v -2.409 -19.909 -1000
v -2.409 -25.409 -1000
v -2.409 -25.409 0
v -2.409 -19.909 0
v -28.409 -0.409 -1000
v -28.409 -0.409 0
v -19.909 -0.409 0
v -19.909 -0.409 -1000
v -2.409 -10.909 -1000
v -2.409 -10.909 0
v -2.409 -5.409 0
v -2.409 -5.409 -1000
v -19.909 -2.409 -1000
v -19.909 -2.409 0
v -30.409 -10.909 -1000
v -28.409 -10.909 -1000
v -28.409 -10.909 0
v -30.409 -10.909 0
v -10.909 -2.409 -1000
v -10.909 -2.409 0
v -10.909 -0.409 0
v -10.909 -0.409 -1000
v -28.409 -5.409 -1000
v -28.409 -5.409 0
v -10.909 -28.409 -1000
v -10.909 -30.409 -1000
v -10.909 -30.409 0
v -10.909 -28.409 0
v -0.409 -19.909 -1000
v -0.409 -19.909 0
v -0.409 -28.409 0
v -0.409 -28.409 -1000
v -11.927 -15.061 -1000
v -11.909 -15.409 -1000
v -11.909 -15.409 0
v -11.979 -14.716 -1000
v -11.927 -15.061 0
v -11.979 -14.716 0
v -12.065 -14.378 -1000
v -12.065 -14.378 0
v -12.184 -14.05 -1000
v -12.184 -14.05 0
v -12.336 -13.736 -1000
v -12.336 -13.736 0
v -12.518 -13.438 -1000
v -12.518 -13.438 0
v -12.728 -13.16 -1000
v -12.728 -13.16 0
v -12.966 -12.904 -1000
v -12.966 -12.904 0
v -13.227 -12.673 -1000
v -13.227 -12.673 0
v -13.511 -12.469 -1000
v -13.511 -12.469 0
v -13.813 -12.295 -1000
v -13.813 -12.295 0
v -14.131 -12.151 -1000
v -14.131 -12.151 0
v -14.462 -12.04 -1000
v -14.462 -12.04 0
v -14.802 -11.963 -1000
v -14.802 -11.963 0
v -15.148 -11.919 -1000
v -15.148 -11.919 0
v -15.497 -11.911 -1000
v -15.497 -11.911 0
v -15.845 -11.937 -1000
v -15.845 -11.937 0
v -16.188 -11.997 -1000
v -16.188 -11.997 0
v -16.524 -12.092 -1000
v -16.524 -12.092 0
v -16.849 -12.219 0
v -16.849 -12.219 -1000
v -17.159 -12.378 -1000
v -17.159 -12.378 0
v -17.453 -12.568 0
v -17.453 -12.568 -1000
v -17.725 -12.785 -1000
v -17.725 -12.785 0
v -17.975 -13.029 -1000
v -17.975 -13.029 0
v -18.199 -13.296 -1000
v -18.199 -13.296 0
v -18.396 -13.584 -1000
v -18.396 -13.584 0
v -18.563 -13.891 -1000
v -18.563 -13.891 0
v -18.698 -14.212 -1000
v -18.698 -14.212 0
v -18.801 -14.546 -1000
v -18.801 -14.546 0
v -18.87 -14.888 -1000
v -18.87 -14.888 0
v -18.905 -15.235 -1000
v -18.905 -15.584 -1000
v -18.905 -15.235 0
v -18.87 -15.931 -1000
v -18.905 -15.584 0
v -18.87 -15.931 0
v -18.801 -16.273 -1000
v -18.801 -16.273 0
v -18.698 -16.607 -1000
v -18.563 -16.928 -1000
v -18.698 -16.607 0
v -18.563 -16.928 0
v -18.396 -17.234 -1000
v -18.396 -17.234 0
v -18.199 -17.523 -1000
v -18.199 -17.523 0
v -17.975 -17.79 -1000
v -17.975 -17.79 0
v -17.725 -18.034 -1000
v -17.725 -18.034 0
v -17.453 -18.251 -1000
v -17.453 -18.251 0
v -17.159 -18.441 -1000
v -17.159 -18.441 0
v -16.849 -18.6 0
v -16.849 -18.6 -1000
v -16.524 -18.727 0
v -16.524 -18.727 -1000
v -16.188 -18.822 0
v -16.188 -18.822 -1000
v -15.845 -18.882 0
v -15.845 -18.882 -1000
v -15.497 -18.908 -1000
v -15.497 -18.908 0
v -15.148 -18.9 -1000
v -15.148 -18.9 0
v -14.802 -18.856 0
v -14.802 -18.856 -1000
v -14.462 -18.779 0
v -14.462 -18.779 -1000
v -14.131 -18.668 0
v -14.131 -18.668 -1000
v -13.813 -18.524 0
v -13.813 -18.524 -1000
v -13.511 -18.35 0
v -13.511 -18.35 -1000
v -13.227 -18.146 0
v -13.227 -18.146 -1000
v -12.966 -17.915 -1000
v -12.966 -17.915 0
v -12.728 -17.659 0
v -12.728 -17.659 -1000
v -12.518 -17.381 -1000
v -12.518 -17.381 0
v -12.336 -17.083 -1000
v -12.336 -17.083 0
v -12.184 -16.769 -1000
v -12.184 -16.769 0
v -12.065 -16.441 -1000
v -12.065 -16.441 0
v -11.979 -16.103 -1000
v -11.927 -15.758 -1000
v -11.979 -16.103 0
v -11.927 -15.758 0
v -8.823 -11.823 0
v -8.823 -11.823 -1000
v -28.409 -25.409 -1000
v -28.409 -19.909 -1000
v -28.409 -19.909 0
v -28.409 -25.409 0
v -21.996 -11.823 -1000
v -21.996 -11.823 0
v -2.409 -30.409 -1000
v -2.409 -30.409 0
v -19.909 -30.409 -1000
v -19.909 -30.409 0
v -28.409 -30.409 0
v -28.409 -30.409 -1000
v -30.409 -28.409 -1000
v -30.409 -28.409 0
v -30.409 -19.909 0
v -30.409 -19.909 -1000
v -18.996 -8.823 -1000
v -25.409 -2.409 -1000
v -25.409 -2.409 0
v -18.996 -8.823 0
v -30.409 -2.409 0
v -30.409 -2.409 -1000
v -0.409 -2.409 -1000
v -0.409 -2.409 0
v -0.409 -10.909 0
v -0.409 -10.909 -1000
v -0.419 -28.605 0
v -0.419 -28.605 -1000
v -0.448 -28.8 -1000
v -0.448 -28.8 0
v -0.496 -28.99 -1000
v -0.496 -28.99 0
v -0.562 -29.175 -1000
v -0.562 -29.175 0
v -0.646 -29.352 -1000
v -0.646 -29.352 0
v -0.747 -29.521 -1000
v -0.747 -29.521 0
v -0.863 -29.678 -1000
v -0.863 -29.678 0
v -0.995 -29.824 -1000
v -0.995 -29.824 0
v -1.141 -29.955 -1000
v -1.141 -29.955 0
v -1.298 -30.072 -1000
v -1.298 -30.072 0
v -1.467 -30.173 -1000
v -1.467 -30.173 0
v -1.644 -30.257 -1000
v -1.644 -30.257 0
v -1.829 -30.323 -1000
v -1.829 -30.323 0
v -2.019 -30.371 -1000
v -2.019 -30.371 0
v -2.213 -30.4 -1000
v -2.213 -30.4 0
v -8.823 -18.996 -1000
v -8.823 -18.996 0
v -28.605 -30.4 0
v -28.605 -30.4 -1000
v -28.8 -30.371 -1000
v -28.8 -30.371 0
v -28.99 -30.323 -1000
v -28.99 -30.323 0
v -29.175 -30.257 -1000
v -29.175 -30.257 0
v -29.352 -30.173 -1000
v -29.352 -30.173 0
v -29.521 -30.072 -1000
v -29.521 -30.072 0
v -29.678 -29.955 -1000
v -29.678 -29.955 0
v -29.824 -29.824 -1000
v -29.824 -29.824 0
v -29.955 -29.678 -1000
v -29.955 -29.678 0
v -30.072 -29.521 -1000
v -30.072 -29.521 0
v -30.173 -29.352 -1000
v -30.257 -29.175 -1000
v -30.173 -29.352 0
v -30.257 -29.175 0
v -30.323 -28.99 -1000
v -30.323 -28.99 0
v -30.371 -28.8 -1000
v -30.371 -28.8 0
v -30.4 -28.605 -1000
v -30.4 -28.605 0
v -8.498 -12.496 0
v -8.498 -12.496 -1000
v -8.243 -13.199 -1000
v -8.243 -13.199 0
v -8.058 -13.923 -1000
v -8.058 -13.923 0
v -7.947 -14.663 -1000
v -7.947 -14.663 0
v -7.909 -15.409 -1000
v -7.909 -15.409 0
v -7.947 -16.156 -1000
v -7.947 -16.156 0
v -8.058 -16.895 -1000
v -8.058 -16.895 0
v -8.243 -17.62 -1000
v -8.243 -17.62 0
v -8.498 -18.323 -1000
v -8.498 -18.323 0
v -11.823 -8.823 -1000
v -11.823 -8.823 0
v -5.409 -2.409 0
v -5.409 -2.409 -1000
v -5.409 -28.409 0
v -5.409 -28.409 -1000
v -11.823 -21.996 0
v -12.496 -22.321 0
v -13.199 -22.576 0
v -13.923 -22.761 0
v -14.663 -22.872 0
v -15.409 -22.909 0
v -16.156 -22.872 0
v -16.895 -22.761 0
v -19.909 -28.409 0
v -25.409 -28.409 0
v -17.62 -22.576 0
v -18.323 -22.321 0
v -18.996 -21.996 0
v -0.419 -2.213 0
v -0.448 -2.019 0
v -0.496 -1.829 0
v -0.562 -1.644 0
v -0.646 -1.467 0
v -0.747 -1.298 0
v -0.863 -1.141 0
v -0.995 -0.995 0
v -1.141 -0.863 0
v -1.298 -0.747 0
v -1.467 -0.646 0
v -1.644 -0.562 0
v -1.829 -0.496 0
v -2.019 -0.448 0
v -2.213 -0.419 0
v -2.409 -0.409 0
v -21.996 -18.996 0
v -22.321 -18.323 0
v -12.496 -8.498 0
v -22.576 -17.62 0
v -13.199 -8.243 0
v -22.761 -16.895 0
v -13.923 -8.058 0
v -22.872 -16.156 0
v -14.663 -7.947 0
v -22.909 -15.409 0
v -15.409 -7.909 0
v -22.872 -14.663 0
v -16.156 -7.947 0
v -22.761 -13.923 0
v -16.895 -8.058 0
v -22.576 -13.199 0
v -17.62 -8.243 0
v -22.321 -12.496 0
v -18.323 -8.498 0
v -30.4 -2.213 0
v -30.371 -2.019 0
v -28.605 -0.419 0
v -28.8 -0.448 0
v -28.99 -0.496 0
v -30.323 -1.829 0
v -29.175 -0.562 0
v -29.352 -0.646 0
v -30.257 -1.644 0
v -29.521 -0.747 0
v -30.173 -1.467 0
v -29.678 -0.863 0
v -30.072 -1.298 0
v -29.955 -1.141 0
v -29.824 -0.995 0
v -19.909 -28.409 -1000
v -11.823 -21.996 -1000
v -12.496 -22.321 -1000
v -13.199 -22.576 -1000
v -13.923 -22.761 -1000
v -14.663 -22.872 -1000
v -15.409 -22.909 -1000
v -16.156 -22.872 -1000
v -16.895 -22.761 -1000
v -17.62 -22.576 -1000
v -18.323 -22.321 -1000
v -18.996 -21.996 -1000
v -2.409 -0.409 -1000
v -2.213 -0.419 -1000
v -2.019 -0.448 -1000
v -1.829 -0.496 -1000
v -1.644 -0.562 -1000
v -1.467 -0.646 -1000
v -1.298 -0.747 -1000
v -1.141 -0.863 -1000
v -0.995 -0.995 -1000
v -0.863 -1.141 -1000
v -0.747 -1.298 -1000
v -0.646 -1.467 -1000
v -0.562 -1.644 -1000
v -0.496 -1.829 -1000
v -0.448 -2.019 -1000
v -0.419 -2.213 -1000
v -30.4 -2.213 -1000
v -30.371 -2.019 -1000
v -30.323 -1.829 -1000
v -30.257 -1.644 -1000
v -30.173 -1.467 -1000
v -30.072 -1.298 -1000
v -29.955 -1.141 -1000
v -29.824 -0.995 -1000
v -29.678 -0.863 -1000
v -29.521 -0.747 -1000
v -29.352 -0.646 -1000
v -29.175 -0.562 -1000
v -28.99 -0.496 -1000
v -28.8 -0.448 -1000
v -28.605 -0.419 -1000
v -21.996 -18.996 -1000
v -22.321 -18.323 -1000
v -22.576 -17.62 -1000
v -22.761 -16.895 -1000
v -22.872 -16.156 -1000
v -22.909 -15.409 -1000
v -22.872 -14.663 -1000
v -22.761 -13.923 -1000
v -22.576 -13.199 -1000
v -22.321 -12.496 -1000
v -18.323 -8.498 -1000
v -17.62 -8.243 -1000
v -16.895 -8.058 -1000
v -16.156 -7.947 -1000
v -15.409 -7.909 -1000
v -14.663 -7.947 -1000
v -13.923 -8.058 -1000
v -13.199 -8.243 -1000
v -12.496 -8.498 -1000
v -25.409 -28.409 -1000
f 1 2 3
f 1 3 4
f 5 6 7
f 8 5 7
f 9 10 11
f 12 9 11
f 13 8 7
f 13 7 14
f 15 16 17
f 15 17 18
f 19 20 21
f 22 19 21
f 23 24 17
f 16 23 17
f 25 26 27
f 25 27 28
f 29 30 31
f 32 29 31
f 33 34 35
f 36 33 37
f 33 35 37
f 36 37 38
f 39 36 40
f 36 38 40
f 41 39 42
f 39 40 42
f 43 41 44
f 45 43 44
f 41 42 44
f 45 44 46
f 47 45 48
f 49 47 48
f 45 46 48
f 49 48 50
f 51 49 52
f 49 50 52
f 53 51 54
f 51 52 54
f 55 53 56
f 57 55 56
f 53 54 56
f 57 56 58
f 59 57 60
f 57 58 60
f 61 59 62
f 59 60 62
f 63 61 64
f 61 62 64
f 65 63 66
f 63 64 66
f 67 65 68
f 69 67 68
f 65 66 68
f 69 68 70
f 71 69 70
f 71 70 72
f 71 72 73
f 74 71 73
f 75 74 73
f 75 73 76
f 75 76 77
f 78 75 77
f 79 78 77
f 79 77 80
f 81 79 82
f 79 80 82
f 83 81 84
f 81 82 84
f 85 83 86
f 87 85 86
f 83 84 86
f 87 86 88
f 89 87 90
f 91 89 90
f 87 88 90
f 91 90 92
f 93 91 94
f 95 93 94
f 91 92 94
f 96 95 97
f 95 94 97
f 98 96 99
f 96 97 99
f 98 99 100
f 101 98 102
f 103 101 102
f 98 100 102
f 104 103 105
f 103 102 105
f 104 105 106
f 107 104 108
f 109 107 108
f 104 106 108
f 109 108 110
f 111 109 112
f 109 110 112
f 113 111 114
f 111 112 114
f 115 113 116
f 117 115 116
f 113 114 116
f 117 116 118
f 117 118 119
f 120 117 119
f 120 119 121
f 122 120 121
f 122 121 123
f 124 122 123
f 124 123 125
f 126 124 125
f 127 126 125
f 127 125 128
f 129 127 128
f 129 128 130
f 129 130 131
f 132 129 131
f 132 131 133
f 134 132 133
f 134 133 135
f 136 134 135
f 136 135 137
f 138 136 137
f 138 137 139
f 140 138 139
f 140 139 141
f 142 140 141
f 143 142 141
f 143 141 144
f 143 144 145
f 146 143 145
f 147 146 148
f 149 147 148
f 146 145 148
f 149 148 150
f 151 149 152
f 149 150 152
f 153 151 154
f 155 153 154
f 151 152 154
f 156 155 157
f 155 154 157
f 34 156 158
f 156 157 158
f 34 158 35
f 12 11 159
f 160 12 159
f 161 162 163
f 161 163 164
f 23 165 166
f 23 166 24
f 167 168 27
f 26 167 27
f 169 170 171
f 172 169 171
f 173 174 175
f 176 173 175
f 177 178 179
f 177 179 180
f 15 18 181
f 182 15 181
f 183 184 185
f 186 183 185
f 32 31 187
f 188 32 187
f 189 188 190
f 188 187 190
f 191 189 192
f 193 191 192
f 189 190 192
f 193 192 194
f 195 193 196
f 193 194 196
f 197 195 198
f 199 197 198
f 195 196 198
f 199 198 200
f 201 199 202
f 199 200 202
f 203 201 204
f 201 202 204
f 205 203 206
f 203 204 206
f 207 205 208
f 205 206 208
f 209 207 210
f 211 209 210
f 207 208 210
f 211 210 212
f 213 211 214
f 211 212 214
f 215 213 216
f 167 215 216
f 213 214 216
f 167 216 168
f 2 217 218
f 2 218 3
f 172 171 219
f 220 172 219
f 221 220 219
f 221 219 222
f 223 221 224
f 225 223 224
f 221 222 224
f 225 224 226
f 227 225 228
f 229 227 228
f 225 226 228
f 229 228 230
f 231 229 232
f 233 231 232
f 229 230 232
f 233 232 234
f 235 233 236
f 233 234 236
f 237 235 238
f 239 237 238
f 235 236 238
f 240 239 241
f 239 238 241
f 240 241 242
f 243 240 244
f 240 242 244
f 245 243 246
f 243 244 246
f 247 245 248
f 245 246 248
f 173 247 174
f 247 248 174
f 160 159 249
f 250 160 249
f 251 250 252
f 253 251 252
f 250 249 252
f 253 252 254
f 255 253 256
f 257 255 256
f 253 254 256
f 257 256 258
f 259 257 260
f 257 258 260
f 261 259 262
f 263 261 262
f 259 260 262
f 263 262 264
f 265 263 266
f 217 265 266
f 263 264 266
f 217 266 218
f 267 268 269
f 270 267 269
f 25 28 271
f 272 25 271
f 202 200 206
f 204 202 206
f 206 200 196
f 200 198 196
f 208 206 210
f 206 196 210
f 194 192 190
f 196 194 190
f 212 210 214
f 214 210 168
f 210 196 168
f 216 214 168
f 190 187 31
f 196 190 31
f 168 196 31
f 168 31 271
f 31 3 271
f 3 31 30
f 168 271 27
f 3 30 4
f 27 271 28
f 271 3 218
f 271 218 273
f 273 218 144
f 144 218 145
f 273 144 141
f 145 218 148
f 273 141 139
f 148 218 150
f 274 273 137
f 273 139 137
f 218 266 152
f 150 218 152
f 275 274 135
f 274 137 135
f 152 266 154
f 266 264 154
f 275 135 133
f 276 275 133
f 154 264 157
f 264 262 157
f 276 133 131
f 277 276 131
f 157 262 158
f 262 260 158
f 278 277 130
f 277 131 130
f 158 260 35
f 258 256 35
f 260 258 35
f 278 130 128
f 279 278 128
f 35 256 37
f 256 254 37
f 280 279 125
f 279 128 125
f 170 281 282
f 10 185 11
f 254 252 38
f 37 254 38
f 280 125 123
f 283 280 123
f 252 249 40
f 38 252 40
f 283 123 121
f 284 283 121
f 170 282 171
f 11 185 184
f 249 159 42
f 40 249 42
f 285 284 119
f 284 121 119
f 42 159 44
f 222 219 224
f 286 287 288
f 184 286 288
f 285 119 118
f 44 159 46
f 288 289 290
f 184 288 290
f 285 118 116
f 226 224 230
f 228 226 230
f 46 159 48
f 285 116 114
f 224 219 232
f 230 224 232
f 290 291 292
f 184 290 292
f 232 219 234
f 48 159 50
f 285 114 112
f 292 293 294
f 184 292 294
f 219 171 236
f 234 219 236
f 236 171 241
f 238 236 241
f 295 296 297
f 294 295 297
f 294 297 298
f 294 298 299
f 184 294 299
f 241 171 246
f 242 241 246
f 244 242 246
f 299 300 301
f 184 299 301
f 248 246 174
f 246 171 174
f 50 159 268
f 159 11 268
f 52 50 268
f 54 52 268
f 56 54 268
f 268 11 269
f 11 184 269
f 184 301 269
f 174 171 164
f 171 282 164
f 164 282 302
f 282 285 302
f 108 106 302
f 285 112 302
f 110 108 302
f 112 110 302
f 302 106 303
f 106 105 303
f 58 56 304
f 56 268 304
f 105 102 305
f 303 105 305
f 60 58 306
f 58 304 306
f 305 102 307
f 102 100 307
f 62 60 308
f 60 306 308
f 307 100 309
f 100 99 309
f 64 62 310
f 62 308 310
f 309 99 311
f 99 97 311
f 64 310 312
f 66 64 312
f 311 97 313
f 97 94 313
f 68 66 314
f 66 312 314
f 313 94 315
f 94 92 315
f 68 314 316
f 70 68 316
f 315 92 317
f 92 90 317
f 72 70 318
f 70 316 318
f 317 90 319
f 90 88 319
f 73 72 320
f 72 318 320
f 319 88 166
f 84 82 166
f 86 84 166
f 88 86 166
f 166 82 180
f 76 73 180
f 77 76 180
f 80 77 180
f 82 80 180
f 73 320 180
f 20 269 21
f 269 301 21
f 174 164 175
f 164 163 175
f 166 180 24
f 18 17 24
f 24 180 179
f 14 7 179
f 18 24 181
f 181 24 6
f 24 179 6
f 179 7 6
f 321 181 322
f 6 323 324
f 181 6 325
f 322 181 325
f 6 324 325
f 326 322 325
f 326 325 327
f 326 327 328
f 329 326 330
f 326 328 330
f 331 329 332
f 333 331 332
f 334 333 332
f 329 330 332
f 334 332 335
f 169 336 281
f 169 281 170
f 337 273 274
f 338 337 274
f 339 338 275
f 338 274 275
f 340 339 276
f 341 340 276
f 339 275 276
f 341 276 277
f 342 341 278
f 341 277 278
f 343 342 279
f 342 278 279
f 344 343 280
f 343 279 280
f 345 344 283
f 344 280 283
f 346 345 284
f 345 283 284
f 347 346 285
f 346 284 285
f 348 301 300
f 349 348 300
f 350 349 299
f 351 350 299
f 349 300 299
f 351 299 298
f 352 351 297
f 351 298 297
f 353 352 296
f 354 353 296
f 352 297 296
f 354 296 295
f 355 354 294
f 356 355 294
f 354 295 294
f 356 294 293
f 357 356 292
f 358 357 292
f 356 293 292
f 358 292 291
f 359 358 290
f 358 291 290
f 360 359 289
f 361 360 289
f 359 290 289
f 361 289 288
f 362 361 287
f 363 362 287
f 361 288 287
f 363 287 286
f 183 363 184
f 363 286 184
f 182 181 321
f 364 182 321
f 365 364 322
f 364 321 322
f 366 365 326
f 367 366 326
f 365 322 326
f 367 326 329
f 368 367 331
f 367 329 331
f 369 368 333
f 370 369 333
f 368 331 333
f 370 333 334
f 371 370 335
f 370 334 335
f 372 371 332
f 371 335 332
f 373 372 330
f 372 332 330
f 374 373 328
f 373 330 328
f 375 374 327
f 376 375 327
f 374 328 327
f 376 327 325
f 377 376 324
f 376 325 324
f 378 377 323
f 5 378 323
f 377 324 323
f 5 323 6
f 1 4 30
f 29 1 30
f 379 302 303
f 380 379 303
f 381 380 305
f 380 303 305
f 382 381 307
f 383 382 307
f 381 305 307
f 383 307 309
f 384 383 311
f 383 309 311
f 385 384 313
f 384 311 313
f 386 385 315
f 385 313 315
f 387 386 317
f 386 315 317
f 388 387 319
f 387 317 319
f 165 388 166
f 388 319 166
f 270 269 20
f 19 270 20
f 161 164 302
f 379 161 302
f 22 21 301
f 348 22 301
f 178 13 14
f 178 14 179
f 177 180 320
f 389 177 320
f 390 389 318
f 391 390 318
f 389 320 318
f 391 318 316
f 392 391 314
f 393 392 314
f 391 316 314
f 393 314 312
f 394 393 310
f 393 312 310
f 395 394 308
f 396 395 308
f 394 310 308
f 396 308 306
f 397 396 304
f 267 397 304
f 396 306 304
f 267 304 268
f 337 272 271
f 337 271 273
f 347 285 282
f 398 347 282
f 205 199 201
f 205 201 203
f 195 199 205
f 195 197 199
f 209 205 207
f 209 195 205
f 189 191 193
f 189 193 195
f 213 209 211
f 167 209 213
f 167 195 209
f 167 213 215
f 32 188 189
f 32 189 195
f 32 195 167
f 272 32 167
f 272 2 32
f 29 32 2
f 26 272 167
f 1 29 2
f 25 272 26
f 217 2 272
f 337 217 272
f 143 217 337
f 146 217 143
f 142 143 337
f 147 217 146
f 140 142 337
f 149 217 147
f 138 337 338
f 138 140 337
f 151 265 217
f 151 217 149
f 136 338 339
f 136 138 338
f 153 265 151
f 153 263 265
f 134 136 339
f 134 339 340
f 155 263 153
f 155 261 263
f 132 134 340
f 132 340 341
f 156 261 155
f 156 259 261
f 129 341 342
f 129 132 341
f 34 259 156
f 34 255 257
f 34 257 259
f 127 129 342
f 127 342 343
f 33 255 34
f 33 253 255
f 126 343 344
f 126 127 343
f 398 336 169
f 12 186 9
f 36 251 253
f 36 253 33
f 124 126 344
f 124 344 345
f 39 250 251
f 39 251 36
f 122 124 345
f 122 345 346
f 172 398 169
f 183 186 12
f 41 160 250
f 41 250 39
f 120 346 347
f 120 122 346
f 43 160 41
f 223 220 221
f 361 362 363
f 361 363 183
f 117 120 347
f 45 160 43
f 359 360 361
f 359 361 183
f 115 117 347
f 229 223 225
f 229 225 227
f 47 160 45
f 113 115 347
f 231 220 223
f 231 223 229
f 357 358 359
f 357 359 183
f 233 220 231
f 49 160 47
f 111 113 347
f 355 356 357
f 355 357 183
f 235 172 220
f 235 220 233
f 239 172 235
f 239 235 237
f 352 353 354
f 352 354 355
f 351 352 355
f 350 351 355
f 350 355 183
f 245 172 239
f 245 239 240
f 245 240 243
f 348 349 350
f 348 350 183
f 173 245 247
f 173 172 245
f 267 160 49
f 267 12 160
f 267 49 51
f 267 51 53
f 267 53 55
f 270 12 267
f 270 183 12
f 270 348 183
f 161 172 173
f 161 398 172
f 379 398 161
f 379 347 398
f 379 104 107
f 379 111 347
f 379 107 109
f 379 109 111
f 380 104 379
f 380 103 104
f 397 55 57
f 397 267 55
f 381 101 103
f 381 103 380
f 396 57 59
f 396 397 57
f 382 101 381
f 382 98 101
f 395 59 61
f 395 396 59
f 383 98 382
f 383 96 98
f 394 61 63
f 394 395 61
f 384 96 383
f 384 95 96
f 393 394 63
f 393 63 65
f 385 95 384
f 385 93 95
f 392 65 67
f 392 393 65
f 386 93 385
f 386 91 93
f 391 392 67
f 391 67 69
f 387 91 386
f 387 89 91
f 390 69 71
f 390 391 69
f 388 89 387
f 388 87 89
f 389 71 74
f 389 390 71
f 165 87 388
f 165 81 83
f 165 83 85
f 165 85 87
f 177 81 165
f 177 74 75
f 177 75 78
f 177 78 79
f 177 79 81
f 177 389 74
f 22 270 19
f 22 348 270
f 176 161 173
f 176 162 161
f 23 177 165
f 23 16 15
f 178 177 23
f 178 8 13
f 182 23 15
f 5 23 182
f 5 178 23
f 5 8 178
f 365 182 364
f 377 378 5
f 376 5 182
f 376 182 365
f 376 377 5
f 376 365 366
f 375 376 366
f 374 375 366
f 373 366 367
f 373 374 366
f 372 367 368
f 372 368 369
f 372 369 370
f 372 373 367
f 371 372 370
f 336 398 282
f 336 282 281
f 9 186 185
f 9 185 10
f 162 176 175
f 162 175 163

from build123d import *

# Parameters (mm, degrees)
ESBO_O1_R                = 3.5
RESSALTO_EXTRUS_O1_DEPTH = 1000


with BuildPart() as part:
    # Esboço1 → Ressalto-extrusão1 (new body)
    with BuildSketch(Plane.XY):
        with BuildLine():
            Line((-8.822717355, -18.99621233), (-2.409464842, -25.409464842))
            Line((-2.409464842, -25.409464842), (-2.409464842, -19.909464842))
            Line((-2.409464842, -19.909464842), (-0.409464842, -19.909464842))
            Line((-0.409464842, -19.909464842), (-0.409464842, -28.409464842))
            ThreePointArc((-0.409464842, -28.409464842), (-0.99525128, -29.823678405), (-2.409464842, -30.409464842))
            Line((-2.409464842, -30.409464842), (-10.909464842, -30.409464842))
            Line((-10.909464842, -30.409464842), (-10.909464842, -28.409464842))
            Line((-10.909464842, -28.409464842), (-5.409464842, -28.409464842))
            Line((-5.409464842, -28.409464842), (-11.822717355, -21.99621233))
            ThreePointArc((-11.822717355, -21.99621233), (-15.409464842, -22.909464842), (-18.99621233, -21.99621233))
            Line((-18.99621233, -21.99621233), (-25.409464842, -28.409464842))
            Line((-25.409464842, -28.409464842), (-19.909464842, -28.409464842))
            Line((-19.909464842, -28.409464842), (-19.909464842, -30.409464842))
            Line((-19.909464842, -30.409464842), (-28.409464842, -30.409464842))
            ThreePointArc((-28.409464842, -30.409464842), (-29.823678405, -29.823678405), (-30.409464842, -28.409464842))
            Line((-30.409464842, -28.409464842), (-30.409464842, -19.909464842))
            Line((-30.409464842, -19.909464842), (-28.409464842, -19.909464842))
            Line((-28.409464842, -19.909464842), (-28.409464842, -25.409464842))
            Line((-28.409464842, -25.409464842), (-21.99621233, -18.99621233))
            ThreePointArc((-21.99621233, -18.99621233), (-22.909464842, -15.409464842), (-21.99621233, -11.822717355))
            Line((-21.99621233, -11.822717355), (-28.409464842, -5.409464842))
            Line((-28.409464842, -5.409464842), (-28.409464842, -10.909464842))
            Line((-28.409464842, -10.909464842), (-30.409464842, -10.909464842))
            Line((-30.409464842, -10.909464842), (-30.409464842, -2.409464842))
            ThreePointArc((-30.409464842, -2.409464842), (-29.823678405, -0.99525128), (-28.409464842, -0.409464842))
            Line((-28.409464842, -0.409464842), (-19.909464842, -0.409464842))
            Line((-19.909464842, -0.409464842), (-19.909464842, -2.409464842))
            Line((-19.909464842, -2.409464842), (-25.409464842, -2.409464842))
            Line((-25.409464842, -2.409464842), (-18.99621233, -8.822717355))
            ThreePointArc((-18.99621233, -8.822717355), (-15.409464842, -7.909464842), (-11.822717355, -8.822717355))
            Line((-11.822717355, -8.822717355), (-5.409464842, -2.409464842))
            Line((-5.409464842, -2.409464842), (-10.909464842, -2.409464842))
            Line((-10.909464842, -2.409464842), (-10.909464842, -0.409464842))
            Line((-10.909464842, -0.409464842), (-2.409464842, -0.409464842))
            ThreePointArc((-2.409464842, -0.409464842), (-0.99525128, -0.99525128), (-0.409464842, -2.409464842))
            Line((-0.409464842, -2.409464842), (-0.409464842, -10.909464842))
            Line((-0.409464842, -10.909464842), (-2.409464842, -10.909464842))
            Line((-2.409464842, -10.909464842), (-2.409464842, -5.409464842))
            Line((-2.409464842, -5.409464842), (-8.822717355, -11.822717355))
            ThreePointArc((-8.822717355, -11.822717355), (-7.909464842, -15.409464842), (-8.822717355, -18.99621233))
        make_face()
        with Locations((-15.409464842, -15.409464842)):
            Circle(ESBO_O1_R, mode=Mode.SUBTRACT)
    extrude(amount=-RESSALTO_EXTRUS_O1_DEPTH)


solid = part.part
